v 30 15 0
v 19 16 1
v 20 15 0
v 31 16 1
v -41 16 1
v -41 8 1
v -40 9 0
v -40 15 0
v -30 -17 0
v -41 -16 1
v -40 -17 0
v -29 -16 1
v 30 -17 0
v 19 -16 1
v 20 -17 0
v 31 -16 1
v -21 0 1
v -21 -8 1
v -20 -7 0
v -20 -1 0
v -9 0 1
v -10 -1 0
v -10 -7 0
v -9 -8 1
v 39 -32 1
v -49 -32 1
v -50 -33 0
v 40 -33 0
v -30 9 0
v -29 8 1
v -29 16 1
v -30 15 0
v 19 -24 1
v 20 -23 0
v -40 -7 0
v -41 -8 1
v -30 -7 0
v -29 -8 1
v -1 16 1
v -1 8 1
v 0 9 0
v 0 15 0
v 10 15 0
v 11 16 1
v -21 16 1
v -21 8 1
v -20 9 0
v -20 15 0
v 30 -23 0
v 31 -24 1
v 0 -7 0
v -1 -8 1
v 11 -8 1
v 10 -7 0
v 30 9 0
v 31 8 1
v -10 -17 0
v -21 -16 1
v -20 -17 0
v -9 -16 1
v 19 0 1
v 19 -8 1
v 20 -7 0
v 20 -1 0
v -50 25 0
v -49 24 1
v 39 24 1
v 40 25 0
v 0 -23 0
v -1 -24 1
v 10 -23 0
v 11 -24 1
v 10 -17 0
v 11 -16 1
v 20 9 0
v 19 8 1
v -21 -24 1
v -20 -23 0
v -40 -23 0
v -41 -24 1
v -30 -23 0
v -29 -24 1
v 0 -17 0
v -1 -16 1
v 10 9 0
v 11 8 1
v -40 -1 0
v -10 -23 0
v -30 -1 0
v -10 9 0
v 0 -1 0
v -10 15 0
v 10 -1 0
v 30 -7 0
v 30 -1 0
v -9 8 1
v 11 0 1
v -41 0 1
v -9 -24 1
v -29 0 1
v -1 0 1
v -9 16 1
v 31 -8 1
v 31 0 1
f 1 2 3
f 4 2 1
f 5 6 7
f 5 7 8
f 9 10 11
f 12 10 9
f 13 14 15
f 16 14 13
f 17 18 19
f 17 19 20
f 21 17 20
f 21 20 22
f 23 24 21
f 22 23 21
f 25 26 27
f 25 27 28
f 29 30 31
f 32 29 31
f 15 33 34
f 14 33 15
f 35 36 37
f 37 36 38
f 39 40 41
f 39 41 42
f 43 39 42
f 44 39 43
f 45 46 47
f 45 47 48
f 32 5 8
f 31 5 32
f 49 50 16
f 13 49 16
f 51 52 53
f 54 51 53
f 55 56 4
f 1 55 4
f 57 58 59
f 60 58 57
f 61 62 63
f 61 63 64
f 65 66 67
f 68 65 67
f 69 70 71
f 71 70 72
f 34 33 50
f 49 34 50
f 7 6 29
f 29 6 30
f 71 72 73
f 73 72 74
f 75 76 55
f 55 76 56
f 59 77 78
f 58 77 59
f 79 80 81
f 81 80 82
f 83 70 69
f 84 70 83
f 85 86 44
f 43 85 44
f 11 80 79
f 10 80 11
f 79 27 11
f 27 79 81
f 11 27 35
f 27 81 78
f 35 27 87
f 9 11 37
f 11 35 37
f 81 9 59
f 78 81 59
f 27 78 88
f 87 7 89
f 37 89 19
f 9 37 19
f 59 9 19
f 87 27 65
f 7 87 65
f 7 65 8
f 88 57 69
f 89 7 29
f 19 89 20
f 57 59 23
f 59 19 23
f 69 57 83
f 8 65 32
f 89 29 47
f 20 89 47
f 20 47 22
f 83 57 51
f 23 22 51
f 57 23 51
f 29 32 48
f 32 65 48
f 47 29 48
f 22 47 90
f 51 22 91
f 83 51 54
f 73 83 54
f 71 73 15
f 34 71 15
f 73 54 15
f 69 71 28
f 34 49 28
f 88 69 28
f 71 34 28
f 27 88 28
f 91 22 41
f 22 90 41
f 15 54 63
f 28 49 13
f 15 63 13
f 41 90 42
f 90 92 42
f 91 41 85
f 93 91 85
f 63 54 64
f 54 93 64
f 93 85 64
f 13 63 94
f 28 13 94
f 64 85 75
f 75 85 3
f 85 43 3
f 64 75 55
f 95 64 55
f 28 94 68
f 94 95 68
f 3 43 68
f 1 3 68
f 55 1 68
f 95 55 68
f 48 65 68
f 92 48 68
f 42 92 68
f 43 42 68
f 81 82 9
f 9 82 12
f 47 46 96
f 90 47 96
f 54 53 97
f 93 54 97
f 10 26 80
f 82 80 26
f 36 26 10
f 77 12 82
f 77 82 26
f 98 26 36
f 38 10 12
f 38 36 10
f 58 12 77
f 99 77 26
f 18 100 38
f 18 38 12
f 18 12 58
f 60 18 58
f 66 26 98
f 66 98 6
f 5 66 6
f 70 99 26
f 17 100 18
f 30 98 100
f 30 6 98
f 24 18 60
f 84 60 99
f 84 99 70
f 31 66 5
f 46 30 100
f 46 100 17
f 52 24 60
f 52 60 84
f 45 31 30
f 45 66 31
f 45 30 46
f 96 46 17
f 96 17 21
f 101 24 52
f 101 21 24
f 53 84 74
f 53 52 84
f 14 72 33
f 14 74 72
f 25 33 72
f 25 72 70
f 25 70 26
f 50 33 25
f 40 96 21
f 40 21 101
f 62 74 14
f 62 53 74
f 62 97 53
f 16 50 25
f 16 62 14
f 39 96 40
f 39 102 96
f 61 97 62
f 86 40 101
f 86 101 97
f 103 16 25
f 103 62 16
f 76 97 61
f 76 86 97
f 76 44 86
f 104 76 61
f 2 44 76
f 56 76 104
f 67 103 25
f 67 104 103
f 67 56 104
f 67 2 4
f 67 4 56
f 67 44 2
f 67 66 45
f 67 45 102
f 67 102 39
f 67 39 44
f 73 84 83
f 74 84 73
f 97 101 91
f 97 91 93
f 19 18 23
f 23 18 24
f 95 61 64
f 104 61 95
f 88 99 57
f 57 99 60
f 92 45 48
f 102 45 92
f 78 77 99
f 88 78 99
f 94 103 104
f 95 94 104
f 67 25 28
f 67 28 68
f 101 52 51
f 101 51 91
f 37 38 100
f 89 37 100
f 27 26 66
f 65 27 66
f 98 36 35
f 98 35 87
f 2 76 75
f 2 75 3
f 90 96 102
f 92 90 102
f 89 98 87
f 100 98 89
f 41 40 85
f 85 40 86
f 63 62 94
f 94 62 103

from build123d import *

# Parameters (mm, degrees)
F0_W     = 90
F0_H     = 58
F0_W_2   = 10
F0_H_2   = 6
F1_DEPTH = 1
F2_SIZE  = 0.99999


# Not quite as in the source:
# - a fillet or chamfer is up to 0.001 mm smaller than in the source, because OpenCascade refuses the exact size


with BuildPart() as f1:
    # F0 (on Top) → F1 (new body)
    with BuildSketch(Plane.XY):
        with Locations((-5, -4)):
            Rectangle(F0_W, F0_H)
        with Locations((-35, -20)):
            Rectangle(F0_W_2, F0_H_2, mode=Mode.SUBTRACT)
        with Locations((-15, -20)):
            Rectangle(F0_W_2, F0_H_2, mode=Mode.SUBTRACT)
        with Locations((5, -20)):
            Rectangle(F0_W_2, F0_H_2, mode=Mode.SUBTRACT)
        with Locations((25, -20)):
            Rectangle(F0_W_2, F0_H_2, mode=Mode.SUBTRACT)
        with Locations((-35, -4)):
            Rectangle(F0_W_2, F0_H_2, mode=Mode.SUBTRACT)
        with Locations((-15, -4)):
            Rectangle(F0_W_2, F0_H_2, mode=Mode.SUBTRACT)
        with Locations((-35, 12)):
            Rectangle(F0_W_2, F0_H_2, mode=Mode.SUBTRACT)
        with Locations((-15, 12)):
            Rectangle(F0_W_2, F0_H_2, mode=Mode.SUBTRACT)
        with Locations((5, -4)):
            Rectangle(F0_W_2, F0_H_2, mode=Mode.SUBTRACT)
        with Locations((25, -4)):
            Rectangle(F0_W_2, F0_H_2, mode=Mode.SUBTRACT)
        with Locations((5, 12)):
            Rectangle(F0_W_2, F0_H_2, mode=Mode.SUBTRACT)
        with Locations((25, 12)):
            Rectangle(F0_W_2, F0_H_2, mode=Mode.SUBTRACT)
    extrude(amount=F1_DEPTH)

    # F2 (size 1 in the source; OpenCascade refuses exactly that, so slightly less here)
    f2_edges = [f1.edges().sort_by_distance(p)[0] for p in [
        (-35, 15, 1),
        (-40, 12, 1),
        (-35, 9, 1),
        (-30, 12, 1),
        (-30, -4, 1),
        (-35, -7, 1),
        (-35, -1, 1),
        (-40, -4, 1),
        (-35, -17, 1),
        (-40, -20, 1),
        (-35, -23, 1),
        (-30, -20, 1),
        (-5, 25, 1),
        (-50, -4, 1),
        (-5, -33, 1),
        (40, -4, 1),
        (-20, -20, 1),
        (-15, -17, 1),
        (-10, -20, 1),
        (-15, -23, 1),
        (5, -23, 1),
        (0, -20, 1),
        (5, -17, 1),
        (10, -20, 1),
        (25, -23, 1),
        (20, -20, 1),
        (25, -17, 1),
        (30, -20, 1),
        (-20, -4, 1),
        (-15, -1, 1),
        (-10, -4, 1),
        (-15, -7, 1),
        (-20, 12, 1),
        (-15, 15, 1),
        (-10, 12, 1),
        (-15, 9, 1),
        (5, -7, 1),
        (0, -4, 1),
        (5, -1, 1),
        (10, -4, 1),
        (25, -7, 1),
        (20, -4, 1),
        (25, -1, 1),
        (30, -4, 1),
        (0, 12, 1),
        (5, 15, 1),
        (10, 12, 1),
        (5, 9, 1),
        (25, 9, 1),
        (20, 12, 1),
        (25, 15, 1),
        (30, 12, 1),
    ]]
    chamfer(f2_edges, length=F2_SIZE)


solid = f1.part
